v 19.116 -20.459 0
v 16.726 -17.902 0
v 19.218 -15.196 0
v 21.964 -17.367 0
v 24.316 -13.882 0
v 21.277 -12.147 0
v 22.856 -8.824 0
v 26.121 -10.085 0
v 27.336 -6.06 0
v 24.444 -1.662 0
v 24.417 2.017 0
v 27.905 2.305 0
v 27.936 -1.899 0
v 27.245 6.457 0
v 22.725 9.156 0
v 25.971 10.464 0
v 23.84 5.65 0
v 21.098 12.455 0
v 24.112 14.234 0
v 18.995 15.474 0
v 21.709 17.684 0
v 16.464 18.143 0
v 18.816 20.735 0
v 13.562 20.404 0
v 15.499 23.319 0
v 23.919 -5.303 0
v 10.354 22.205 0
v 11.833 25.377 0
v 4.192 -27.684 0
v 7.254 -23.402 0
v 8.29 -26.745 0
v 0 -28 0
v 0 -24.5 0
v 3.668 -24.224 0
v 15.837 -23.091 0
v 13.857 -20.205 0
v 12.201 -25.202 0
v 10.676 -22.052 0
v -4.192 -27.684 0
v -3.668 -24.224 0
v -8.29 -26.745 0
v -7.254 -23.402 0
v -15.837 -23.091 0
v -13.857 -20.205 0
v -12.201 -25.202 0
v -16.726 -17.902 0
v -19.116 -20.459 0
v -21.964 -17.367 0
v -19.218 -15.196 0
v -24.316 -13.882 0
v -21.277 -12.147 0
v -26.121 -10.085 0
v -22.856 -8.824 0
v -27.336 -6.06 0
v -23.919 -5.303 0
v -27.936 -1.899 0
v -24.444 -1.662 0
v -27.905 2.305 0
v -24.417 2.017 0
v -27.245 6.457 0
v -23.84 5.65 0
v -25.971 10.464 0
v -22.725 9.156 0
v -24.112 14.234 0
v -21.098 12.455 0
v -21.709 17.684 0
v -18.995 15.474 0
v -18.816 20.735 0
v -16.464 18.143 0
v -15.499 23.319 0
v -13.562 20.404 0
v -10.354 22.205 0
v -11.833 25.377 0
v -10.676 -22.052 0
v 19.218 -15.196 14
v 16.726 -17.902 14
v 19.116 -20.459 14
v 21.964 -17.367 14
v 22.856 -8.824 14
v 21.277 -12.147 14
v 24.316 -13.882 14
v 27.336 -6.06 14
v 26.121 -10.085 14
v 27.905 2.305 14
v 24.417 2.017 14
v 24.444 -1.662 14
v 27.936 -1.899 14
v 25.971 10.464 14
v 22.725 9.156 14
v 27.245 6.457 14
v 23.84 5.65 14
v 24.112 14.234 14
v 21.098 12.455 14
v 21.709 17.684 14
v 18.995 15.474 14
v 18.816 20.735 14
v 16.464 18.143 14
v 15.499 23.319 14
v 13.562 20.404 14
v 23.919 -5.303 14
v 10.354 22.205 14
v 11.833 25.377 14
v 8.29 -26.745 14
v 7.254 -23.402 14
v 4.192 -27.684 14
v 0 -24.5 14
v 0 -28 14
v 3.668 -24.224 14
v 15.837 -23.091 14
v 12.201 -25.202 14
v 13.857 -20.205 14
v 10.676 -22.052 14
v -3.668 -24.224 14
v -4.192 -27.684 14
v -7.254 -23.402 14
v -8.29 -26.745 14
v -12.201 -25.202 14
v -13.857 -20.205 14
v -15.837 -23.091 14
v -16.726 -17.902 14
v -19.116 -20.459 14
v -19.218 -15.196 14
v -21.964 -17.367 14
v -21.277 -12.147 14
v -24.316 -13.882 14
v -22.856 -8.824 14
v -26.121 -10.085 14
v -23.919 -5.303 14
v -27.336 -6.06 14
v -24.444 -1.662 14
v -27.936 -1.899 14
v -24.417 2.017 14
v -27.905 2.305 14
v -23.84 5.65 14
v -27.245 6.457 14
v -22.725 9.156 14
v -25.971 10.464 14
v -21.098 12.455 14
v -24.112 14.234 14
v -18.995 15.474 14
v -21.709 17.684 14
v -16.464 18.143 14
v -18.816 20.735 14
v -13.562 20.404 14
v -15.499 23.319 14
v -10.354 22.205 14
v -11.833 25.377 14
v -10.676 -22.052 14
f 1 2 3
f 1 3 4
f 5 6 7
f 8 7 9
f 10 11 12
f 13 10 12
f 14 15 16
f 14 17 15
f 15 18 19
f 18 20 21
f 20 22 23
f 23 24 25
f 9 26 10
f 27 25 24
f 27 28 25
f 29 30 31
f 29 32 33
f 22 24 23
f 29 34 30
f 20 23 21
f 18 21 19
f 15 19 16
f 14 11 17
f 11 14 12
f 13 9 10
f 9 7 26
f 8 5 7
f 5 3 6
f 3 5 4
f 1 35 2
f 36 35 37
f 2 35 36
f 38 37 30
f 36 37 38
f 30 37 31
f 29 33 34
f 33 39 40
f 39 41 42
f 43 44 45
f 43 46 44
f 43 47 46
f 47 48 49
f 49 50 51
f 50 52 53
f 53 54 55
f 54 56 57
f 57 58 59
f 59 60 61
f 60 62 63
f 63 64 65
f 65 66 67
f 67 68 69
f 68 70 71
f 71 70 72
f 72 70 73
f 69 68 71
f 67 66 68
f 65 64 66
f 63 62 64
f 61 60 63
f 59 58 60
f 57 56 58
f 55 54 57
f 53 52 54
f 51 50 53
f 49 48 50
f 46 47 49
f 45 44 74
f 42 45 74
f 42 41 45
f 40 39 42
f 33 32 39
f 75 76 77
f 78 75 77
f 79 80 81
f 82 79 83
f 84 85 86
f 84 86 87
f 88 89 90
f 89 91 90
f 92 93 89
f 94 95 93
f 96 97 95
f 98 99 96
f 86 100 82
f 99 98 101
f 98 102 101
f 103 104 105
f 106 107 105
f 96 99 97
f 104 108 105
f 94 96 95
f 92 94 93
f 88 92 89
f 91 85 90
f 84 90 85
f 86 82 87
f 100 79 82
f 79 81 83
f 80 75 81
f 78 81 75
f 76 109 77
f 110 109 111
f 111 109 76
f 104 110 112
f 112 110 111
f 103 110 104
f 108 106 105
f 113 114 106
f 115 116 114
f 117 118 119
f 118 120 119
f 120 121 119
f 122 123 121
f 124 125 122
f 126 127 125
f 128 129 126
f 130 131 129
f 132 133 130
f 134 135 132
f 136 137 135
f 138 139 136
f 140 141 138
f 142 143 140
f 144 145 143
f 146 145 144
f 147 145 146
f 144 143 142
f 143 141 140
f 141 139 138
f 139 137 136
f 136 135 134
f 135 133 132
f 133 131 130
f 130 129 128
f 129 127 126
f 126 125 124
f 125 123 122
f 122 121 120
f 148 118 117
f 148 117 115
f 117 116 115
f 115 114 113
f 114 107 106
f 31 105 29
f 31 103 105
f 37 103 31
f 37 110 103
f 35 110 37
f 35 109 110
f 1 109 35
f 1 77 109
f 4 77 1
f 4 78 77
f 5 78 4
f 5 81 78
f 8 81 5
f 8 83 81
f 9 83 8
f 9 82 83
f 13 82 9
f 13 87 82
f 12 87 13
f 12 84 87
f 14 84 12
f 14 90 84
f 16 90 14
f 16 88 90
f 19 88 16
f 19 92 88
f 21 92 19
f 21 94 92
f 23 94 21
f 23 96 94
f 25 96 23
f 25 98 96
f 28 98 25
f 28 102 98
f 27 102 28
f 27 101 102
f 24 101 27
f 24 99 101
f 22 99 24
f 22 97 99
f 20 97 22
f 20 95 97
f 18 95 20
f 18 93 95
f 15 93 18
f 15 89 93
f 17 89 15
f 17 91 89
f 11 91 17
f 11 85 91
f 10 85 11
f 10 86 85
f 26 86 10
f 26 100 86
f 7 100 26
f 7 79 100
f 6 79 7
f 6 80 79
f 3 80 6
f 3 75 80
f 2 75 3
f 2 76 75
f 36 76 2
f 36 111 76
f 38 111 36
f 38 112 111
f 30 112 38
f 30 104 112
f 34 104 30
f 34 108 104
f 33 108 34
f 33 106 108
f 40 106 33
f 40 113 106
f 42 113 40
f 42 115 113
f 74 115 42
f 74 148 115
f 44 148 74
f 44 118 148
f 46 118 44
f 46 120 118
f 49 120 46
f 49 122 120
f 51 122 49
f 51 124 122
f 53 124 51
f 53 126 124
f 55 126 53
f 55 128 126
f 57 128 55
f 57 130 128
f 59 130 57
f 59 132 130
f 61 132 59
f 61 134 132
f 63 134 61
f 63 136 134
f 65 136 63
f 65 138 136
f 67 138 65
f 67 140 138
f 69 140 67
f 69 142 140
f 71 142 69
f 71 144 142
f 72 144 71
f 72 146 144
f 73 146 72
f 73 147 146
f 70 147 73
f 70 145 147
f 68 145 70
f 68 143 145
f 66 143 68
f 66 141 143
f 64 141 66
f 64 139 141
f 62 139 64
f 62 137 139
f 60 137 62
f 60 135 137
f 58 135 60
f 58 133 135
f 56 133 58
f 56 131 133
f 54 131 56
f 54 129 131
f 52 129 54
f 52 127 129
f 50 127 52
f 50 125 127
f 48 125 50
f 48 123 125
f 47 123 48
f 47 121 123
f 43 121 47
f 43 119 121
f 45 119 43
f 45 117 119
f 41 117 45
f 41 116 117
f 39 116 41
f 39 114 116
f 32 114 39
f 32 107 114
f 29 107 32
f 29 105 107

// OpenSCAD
$fn = 32;

// ----------------------------------------------------------------------
// Spring clip: 56 mm outside, 3.5 mm band, 50 degree opening
// ----------------------------------------------------------------------

// --- parameters (mm) ---
outer_r = 28;             // clip outside radius
inner_r = 24.5;           // clip bore radius
band = 3.5;               // band thickness
clip_w = 14;              // clip width
opening = 50;             // opening angle

clip_profile = [[-11.833, 25.377], [-15.499, 23.319], [-18.816, 20.735], [-21.709, 17.684], [-24.112, 14.234], [-25.971, 10.464], [-27.245, 6.457], [-27.905, 2.305], [-27.936, -1.899], [-27.336, -6.06], [-26.121, -10.085], [-24.316, -13.882], [-21.964, -17.367], [-19.116, -20.459], [-15.837, -23.091], [-12.201, -25.202], [-8.29, -26.745], [-4.192, -27.684], [0, -28], [4.192, -27.684], [8.29, -26.745], [12.201, -25.202], [15.837, -23.091], [19.116, -20.459], [21.964, -17.367], [24.316, -13.882], [26.121, -10.085], [27.336, -6.06], [27.936, -1.899], [27.905, 2.305], [27.245, 6.457], [25.971, 10.464], [24.112, 14.234], [21.709, 17.684], [18.816, 20.735], [15.499, 23.319], [11.833, 25.377], [10.354, 22.205], [13.562, 20.404], [16.464, 18.143], [18.995, 15.474], [21.098, 12.455], [22.725, 9.156], [23.84, 5.65], [24.417, 2.017], [24.444, -1.662], [23.919, -5.303], [22.856, -8.824], [21.277, -12.147], [19.218, -15.196], [16.726, -17.902], [13.857, -20.205], [10.676, -22.052], [7.254, -23.402], [3.668, -24.224], [0, -24.5], [-3.668, -24.224], [-7.254, -23.402], [-10.676, -22.052], [-13.857, -20.205], [-16.726, -17.902], [-19.218, -15.196], [-21.277, -12.147], [-22.856, -8.824], [-23.919, -5.303], [-24.444, -1.662], [-24.417, 2.017], [-23.84, 5.65], [-22.725, 9.156], [-21.098, 12.455], [-18.995, 15.474], [-16.464, 18.143], [-13.562, 20.404], [-10.354, 22.205]];

difference() {
  union() {
    linear_extrude(height = clip_w) polygon(clip_profile);
  }
}
